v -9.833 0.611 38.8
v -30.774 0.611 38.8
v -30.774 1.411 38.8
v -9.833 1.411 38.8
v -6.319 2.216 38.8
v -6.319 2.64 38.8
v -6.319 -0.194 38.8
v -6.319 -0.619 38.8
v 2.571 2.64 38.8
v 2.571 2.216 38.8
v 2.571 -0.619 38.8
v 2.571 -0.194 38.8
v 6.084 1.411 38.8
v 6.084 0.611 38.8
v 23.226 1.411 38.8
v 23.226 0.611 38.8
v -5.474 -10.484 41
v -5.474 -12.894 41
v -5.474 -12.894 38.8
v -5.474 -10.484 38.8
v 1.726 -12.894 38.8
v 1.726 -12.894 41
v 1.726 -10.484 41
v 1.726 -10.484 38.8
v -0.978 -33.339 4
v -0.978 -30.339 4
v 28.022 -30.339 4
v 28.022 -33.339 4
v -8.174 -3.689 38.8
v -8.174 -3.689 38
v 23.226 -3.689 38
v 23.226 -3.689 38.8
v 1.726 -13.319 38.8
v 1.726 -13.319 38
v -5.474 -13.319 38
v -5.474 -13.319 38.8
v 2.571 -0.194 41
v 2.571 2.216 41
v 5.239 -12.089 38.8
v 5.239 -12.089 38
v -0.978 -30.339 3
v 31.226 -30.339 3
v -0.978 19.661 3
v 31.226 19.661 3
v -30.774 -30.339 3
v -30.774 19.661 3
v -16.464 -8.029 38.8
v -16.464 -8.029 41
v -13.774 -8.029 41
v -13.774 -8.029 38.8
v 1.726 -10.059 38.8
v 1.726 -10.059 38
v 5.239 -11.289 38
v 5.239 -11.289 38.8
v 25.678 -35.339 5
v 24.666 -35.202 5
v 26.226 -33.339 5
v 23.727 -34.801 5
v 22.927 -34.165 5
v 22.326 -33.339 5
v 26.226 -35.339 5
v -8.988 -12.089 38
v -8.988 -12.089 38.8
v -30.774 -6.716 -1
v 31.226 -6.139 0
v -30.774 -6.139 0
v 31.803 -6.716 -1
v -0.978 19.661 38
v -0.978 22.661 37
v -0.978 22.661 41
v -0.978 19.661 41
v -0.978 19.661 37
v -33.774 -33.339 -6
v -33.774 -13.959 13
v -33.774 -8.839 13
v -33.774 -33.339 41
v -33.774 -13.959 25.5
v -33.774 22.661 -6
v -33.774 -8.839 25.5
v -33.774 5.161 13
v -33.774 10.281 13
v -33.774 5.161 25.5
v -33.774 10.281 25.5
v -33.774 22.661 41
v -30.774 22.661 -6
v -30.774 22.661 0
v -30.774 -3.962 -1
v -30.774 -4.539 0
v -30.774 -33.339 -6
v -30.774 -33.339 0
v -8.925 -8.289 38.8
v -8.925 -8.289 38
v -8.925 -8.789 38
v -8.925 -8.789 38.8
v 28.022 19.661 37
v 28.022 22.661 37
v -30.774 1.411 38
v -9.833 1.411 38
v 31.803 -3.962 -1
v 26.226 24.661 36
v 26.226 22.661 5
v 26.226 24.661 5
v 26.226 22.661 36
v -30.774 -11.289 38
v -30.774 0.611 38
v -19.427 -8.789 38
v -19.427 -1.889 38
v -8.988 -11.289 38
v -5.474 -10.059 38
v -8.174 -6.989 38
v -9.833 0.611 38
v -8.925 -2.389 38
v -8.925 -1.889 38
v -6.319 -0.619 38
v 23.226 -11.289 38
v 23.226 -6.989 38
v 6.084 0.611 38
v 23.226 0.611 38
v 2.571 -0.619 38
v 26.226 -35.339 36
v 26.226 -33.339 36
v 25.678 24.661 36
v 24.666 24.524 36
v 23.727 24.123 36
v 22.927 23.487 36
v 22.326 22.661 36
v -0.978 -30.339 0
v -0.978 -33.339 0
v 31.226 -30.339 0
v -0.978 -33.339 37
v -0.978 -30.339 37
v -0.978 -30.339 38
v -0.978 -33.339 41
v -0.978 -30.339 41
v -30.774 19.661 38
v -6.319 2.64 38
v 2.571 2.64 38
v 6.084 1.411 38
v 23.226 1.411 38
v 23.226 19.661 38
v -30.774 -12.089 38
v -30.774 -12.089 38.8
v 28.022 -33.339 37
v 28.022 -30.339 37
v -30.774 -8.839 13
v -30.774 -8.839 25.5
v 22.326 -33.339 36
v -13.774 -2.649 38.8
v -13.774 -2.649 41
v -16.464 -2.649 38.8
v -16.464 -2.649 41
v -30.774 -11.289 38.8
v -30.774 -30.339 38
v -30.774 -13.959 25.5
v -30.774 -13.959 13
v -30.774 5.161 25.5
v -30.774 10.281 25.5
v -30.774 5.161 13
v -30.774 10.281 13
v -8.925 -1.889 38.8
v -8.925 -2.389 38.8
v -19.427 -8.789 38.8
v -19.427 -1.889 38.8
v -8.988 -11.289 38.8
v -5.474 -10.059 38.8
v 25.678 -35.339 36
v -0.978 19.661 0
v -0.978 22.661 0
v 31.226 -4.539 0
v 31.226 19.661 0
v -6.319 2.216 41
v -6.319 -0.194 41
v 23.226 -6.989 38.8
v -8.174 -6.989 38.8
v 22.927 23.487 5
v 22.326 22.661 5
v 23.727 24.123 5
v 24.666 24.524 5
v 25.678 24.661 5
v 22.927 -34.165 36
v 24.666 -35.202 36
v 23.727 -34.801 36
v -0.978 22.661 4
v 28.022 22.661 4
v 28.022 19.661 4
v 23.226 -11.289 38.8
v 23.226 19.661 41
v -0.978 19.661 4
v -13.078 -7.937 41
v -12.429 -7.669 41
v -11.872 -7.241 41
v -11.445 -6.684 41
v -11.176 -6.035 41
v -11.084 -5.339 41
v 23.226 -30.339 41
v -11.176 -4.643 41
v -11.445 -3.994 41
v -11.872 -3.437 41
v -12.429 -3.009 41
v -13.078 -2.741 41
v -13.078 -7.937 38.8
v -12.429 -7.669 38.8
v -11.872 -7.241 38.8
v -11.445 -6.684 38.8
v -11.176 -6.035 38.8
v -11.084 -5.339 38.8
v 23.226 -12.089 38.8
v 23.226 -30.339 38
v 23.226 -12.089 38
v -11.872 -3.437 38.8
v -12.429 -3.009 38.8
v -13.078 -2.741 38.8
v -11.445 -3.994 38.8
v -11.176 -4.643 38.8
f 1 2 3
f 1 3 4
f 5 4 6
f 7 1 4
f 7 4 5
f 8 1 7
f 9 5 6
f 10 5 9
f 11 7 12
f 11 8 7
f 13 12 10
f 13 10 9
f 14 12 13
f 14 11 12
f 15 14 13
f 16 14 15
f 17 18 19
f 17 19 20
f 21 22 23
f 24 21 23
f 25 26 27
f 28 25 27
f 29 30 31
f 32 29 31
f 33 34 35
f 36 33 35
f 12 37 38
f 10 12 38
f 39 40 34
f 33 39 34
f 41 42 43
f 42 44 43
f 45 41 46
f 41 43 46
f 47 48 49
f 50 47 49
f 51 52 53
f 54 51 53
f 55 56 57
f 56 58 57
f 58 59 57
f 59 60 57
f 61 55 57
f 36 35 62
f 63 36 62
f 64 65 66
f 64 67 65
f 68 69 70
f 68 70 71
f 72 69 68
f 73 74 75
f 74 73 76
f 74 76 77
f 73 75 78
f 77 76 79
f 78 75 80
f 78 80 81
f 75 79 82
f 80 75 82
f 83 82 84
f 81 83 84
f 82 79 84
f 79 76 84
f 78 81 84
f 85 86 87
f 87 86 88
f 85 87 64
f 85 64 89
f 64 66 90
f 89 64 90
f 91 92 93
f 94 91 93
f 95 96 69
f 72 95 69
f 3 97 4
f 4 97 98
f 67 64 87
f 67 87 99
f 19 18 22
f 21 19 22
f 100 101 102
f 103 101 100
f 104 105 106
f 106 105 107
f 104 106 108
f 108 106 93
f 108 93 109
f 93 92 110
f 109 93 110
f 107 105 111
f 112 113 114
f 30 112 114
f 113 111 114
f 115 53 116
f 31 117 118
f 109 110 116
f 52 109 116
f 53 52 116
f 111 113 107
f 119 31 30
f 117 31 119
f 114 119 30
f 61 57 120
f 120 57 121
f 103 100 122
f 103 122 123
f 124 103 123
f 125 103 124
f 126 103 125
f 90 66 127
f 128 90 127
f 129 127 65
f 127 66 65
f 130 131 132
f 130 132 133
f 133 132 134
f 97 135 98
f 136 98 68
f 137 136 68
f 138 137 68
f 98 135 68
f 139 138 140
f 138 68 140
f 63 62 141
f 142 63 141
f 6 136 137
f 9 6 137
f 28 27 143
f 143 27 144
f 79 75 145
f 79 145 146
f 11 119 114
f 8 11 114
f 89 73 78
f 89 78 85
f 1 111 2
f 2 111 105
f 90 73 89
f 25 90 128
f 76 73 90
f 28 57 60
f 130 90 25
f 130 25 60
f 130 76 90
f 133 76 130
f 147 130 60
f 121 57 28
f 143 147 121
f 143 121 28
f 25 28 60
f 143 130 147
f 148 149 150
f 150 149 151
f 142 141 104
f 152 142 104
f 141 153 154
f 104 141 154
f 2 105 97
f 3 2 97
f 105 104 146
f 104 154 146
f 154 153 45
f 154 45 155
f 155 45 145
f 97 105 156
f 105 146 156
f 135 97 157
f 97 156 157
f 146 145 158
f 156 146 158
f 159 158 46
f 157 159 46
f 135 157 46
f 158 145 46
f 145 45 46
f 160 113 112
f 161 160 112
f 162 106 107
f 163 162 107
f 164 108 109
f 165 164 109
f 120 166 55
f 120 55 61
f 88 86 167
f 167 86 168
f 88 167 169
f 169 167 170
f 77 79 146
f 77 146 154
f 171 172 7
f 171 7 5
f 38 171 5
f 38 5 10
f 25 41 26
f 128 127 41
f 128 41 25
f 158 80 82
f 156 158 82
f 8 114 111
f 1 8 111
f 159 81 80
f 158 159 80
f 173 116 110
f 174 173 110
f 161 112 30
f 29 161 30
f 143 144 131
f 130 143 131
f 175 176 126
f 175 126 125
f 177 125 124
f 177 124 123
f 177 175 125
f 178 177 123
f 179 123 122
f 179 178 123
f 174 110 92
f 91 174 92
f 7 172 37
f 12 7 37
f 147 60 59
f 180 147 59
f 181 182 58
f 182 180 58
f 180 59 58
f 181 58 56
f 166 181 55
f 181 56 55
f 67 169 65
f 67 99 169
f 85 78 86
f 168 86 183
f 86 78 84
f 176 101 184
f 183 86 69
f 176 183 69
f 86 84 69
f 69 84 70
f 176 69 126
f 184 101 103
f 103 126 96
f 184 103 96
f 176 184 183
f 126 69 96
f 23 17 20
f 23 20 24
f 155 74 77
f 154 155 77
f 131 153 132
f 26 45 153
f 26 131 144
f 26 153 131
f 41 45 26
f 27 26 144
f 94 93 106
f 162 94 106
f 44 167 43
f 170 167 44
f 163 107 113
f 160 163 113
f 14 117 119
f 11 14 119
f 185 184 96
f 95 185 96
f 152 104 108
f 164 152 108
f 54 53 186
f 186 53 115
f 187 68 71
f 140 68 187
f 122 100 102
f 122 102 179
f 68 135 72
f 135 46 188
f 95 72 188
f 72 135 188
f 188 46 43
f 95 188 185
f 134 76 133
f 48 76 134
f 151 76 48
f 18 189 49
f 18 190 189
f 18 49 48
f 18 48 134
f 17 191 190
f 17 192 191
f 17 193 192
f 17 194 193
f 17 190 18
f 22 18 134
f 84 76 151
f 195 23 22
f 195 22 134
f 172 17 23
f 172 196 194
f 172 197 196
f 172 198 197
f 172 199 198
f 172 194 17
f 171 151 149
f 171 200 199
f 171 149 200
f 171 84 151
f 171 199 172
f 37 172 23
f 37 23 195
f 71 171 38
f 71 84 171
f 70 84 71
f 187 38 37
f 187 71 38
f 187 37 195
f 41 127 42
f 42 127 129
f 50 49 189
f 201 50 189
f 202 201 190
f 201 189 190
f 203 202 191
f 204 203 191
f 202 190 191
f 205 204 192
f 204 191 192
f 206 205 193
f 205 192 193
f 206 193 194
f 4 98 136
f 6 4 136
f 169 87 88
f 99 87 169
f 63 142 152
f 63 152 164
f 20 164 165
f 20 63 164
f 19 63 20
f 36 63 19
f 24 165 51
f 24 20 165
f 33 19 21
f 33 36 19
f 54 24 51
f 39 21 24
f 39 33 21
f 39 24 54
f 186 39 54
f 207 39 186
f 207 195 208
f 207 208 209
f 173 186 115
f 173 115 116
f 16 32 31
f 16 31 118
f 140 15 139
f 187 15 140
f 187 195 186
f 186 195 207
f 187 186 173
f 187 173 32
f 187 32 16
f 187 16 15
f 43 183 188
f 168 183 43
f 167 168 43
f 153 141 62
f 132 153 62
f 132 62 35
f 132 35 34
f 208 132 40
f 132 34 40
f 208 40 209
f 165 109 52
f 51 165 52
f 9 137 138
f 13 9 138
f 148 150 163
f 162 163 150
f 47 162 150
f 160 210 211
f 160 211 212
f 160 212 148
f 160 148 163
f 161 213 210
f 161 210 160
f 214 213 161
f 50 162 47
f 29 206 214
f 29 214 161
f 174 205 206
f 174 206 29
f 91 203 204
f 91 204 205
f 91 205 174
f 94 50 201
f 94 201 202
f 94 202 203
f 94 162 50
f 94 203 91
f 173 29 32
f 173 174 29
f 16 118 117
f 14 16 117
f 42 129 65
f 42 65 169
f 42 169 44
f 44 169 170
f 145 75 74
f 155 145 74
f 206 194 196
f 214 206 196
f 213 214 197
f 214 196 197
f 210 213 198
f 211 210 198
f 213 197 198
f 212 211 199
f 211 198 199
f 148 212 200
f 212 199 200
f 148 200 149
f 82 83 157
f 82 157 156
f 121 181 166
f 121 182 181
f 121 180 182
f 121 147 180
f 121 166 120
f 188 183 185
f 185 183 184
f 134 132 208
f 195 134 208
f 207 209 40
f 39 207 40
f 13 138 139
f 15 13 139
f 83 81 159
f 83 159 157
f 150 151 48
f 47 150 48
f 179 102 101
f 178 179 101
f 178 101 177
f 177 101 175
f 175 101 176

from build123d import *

# Parameters (mm, degrees)
F0_W        = 65
F0_H        = 56
F1_DEPTH    = 41
F2_T        = -3
F3_W        = 5.12
F3_H        = 12.5
F4_DEPTH    = 4.318
F5_W        = 3.9
F5_H        = 31
F6_DEPTH    = 2
F7_W        = 3.9
F7_H        = 31
F8_DEPTH    = 2
F9_T1_DEPTH = 47.7630546142
F11_DEPTH   = 66.294
F12_W       = 8
F12_H       = 50
F13_DEPTH   = 14.732
F14_W       = 8.89
F14_H       = 2.41
F14_W_2     = 7.2
F15_DEPTH   = 25
F16_W       = 7.2
F16_H       = 2.41
F17_DEPTH   = 0.8
F18_W       = 32.2036024
F18_H       = 3
F19_DEPTH   = 25
F20_W       = 32.2036024
F20_H       = 3
F21_DEPTH   = 3.5
F22_W       = 65
F22_H       = 1.6
F23_DEPTH   = 1
F23_TAPER   = -30
F25_DEPTH   = 0.8
F26_W       = 8.89
F26_H       = 2.41
F27_DEPTH   = 0.8
F28_W       = 0.5773502692
F28_H       = 2.7547005384
F29_DEPTH   = 25
F30_W       = 3
F30_H       = 27.2
F30_H_2     = 28.8
F31_DEPTH   = 6


# Not quite as in the source:
# - a fillet or chamfer that OpenCascade refuses, or shapes differently, is made with other operations: its cross-section is extruded or revolved along the edge and cut away or added


with BuildPart() as f1:
    # F0 (on Top) → F1 (new body)
    with BuildSketch(Plane.XY):
        with Locations((-1.2741552845, -5.3390697837)):
            Rectangle(F0_W, F0_H)
    extrude(amount=F1_DEPTH)

    # F2
    f2_openings = [f1.faces().sort_by_distance(p)[0] for p in [
        (31.225845, -5.33907, 20.5),
    ]]
    offset(amount=F2_T, openings=f2_openings)

    # F3 (on face) → F4 (cut)
    with BuildSketch(Plane(origin=(-33.7741552845, 0, 0), x_dir=(0, -1, 0), z_dir=(-1, 0, 0))):
        with Locations((-7.7209302163, 19.25)):
            Rectangle(F3_W, F3_H)
        with Locations((11.3990697837, 19.25)):
            Rectangle(F3_W, F3_H)
    extrude(amount=-F4_DEPTH, mode=Mode.SUBTRACT)

    # F5 (on face) → F6 (join)
    with BuildSketch(Plane(origin=(0, 22.6609302163, 0), x_dir=(-1, 0, 0), z_dir=(0, 1, 0))):
        with Locations((-24.2758447155, 20.5)):
            Rectangle(F5_W, F5_H)
    extrude(amount=F6_DEPTH)

    # F7 (on face) → F8 (join)
    with BuildSketch(Plane.XZ.offset(33.3390697837)):
        with Locations((24.2758447155, 20.5)):
            Rectangle(F7_W, F7_H)
    extrude(amount=F8_DEPTH)

    # F9: fillet of radius 3.81 on 2 edges, made by hand

    # F9_s2 → F9_t1 (cut)
    with BuildSketch(Plane.XY.offset(-3.3815273071)):
        with BuildLine():
            ThreePointArc((22.3258447155, 22.6609302163), (23.7265335088, 24.1229479424), (25.6784556384, 24.6609302163))
            Line((25.6784556384, 24.6609302163), (22.3258447155, 24.6609302163))
            Line((22.3258447155, 24.6609302163), (22.3258447155, 22.6609302163))
        make_face()
        with BuildLine():
            ThreePointArc((22.3258447155, -33.3390697837), (23.7265335088, -34.8010875098), (25.6784556384, -35.3390697837))
            Line((25.6784556384, -35.3390697837), (22.3258447155, -35.3390697837))
            Line((22.3258447155, -35.3390697837), (22.3258447155, -33.3390697837))
        make_face()
    extrude(amount=F9_T1_DEPTH, mode=Mode.SUBTRACT)

    # F10 (on face) → F11 (cut)
    with BuildSketch(Plane(origin=(0, 22.6609302163, 0), x_dir=(-1, 0, 0), z_dir=(0, 1, 0))):
        Polygon((0.9777576845, 38), (-31.2258447155, 38), (-31.2258447155, 3), (0.9777576845, 3), (0.9777576845, 4), (-28.0222423155, 4), (-28.0222423155, 37), (0.9777576845, 37), align=None)
    extrude(amount=-F11_DEPTH, mode=Mode.SUBTRACT)

    # F12 (on face) → F13 (cut)
    with BuildSketch(Plane.XY.offset(41)):
        with Locations((27.2258447155, -5.3390697837)):
            Rectangle(F12_W, F12_H)
    extrude(amount=-F13_DEPTH, mode=Mode.SUBTRACT)

    # F14 (on face) → F15 (cut)
    with BuildSketch(Plane.XY.offset(41)):
        with Locations((-1.8741552845, 1.0109302163)):
            Rectangle(F14_W, F14_H)
        with BuildLine():
            ThreePointArc((-13.7741552845, -8.0290697837), (-11.8720380431, -7.2411870251), (-11.0841552845, -5.3390697837))
            ThreePointArc((-11.0841552845, -5.3390697837), (-11.8720380431, -3.4369525423), (-13.7741552845, -2.6490697837))
            ThreePointArc((-13.7741552845, -2.6490697837), (-15.6762725259, -3.4369525423), (-16.4641552845, -5.3390697837))
            ThreePointArc((-16.4641552845, -5.3390697837), (-15.6762725259, -7.2411870251), (-13.7741552845, -8.0290697837))
        make_face()
        with Locations((-1.8741552845, -11.6890697837)):
            Rectangle(F14_W_2, F14_H)
        with BuildLine():
            ThreePointArc((-16.4641552845, -5.3390697837), (-15.6762725259, -3.4369525423), (-13.7741552845, -2.6490697837))
            Line((-13.7741552845, -2.6490697837), (-16.4641552845, -2.6490697837))
            Line((-16.4641552845, -2.6490697837), (-16.4641552845, -5.3390697837))
        make_face()
        with BuildLine():
            Line((-16.4641552845, -8.0290697837), (-13.7741552845, -8.0290697837))
            ThreePointArc((-13.7741552845, -8.0290697837), (-15.6762725259, -7.2411870251), (-16.4641552845, -5.3390697837))
            Line((-16.4641552845, -5.3390697837), (-16.4641552845, -8.0290697837))
        make_face()
    extrude(amount=-F15_DEPTH, mode=Mode.SUBTRACT)

    # F16 (on face) → F17 (cut)
    with BuildSketch(Plane(origin=(0, 0, 38), x_dir=(1, 0, 0), z_dir=(0, 0, -1))):
        Polygon((-30.7741552845, 12.0888292812), (-30.7741552845, 11.2888292812), (-8.9876995774, 11.2888292812), (-5.4741552845, 10.0590887787), (1.7258447155, 10.0590887787), (5.2393890084, 11.2888292812), (23.2258447155, 11.2888292812), (23.2258447155, 12.0888292812), (5.2393890084, 12.0888292812), (1.7258447155, 13.3185697837), (-5.4741552845, 13.3185697837), (-8.9876995774, 12.0888292812), align=None)
        with Locations((-1.8741552845, 11.6890697837)):
            Rectangle(F16_W, F16_H, mode=Mode.SUBTRACT)
    extrude(amount=-F17_DEPTH, mode=Mode.SUBTRACT)

    # F18 (on face) → F19 (cut)
    with BuildSketch(Plane(origin=(0, 0, 38), x_dir=(1, 0, 0), z_dir=(0, 0, -1))):
        with Locations((15.1240435155, -21.1609302163)):
            Rectangle(F18_W, F18_H)
        Polygon((-0.9777576845, 33.3390697837), (-0.9777576845, 30.3390697837), (23.2258447155, 30.3390697837), (31.2258447155, 30.3390697837), (31.2258447155, 33.3390697837), align=None)
    extrude(amount=-F19_DEPTH, mode=Mode.SUBTRACT)

    # F20 (on face) → F21 (cut)
    with BuildSketch(Plane(origin=(0, 0, 0), x_dir=(1, 0, 0), z_dir=(0, 0, -1))):
        with Locations((15.1240435155, -21.1609302163)):
            Rectangle(F20_W, F20_H)
        with Locations((15.1240435155, 31.8390697837)):
            Rectangle(F20_W, F20_H)
    extrude(amount=-F21_DEPTH, mode=Mode.SUBTRACT)

    # F22 (on face) → F23 (join)
    with BuildSketch(Plane(origin=(0, 0, 0), x_dir=(1, 0, 0), z_dir=(0, 0, -1))):
        with Locations((-1.2741552845, 5.3390697837)):
            Rectangle(F22_W, F22_H)
    extrude(amount=F23_DEPTH, taper=F23_TAPER)

    # F24 (on face) → F25 (cut)
    with BuildSketch(Plane(origin=(0, 0, 38), x_dir=(1, 0, 0), z_dir=(0, 0, -1))):
        Polygon((23.2258447155, 3.6890697837), (23.2258447155, 6.9890697837), (-8.1741552845, 6.9890697837), (-8.9247106344, 8.2890697837), (-8.9247106344, 8.7890697837), (-19.4271999345, 8.7890697837), (-19.4271999345, 1.8890697837), (-8.9247106344, 1.8890697837), (-8.9247106344, 2.3890697837), (-8.1741552845, 3.6890697837), align=None)
        with BuildLine():
            Line((-16.4641552845, 8.0290697837), (-13.7741552845, 8.0290697837))
            ThreePointArc((-13.7741552845, 8.0290697837), (-11.0841552845, 5.3390697837), (-13.7741552845, 2.6490697837))
            Line((-13.7741552845, 2.6490697837), (-16.4641552845, 2.6490697837))
            Line((-16.4641552845, 2.6490697837), (-16.4641552845, 8.0290697837))
        make_face(mode=Mode.SUBTRACT)
    extrude(amount=-F25_DEPTH, mode=Mode.SUBTRACT)

    # F26 (on face) → F27 (cut)
    with BuildSketch(Plane(origin=(0, 0, 38), x_dir=(1, 0, 0), z_dir=(0, 0, -1))):
        Polygon((-30.7741552845, -0.6106897138), (-30.7741552845, -1.4106897138), (-9.8326995774, -1.4106897138), (-6.3191552845, -2.6404302163), (2.5708447155, -2.6404302163), (6.0843890084, -1.4106897138), (23.2258447155, -1.4106897138), (23.2258447155, -0.6106897138), (6.0843890084, -0.6106897138), (2.5708447155, 0.6190507887), (-6.3191552845, 0.6190507887), (-9.8326995774, -0.6106897138), align=None)
        with Locations((-1.8741552845, -1.0109302163)):
            Rectangle(F26_W, F26_H, mode=Mode.SUBTRACT)
    extrude(amount=-F27_DEPTH, mode=Mode.SUBTRACT)

    # F28 (on face) → F29 (cut)
    with BuildSketch(Plane(origin=(0, 0, -1), x_dir=(1, 0, 0), z_dir=(0, 0, -1))):
        with Locations((-34.0628304191, 5.3390697837)):
            Rectangle(F28_W, F28_H)
    extrude(amount=-F29_DEPTH, mode=Mode.SUBTRACT)

    # F30 (on face) → F31 (join)
    with BuildSketch(Plane(origin=(0, 0, 0), x_dir=(1, 0, 0), z_dir=(0, 0, -1))):
        with Locations((-32.2741552845, 19.7390697837)):
            Rectangle(F30_W, F30_H)
        with Locations((-32.2741552845, -8.2609302163)):
            Rectangle(F30_W, F30_H_2)
    extrude(amount=F31_DEPTH)


solid = f1.part
